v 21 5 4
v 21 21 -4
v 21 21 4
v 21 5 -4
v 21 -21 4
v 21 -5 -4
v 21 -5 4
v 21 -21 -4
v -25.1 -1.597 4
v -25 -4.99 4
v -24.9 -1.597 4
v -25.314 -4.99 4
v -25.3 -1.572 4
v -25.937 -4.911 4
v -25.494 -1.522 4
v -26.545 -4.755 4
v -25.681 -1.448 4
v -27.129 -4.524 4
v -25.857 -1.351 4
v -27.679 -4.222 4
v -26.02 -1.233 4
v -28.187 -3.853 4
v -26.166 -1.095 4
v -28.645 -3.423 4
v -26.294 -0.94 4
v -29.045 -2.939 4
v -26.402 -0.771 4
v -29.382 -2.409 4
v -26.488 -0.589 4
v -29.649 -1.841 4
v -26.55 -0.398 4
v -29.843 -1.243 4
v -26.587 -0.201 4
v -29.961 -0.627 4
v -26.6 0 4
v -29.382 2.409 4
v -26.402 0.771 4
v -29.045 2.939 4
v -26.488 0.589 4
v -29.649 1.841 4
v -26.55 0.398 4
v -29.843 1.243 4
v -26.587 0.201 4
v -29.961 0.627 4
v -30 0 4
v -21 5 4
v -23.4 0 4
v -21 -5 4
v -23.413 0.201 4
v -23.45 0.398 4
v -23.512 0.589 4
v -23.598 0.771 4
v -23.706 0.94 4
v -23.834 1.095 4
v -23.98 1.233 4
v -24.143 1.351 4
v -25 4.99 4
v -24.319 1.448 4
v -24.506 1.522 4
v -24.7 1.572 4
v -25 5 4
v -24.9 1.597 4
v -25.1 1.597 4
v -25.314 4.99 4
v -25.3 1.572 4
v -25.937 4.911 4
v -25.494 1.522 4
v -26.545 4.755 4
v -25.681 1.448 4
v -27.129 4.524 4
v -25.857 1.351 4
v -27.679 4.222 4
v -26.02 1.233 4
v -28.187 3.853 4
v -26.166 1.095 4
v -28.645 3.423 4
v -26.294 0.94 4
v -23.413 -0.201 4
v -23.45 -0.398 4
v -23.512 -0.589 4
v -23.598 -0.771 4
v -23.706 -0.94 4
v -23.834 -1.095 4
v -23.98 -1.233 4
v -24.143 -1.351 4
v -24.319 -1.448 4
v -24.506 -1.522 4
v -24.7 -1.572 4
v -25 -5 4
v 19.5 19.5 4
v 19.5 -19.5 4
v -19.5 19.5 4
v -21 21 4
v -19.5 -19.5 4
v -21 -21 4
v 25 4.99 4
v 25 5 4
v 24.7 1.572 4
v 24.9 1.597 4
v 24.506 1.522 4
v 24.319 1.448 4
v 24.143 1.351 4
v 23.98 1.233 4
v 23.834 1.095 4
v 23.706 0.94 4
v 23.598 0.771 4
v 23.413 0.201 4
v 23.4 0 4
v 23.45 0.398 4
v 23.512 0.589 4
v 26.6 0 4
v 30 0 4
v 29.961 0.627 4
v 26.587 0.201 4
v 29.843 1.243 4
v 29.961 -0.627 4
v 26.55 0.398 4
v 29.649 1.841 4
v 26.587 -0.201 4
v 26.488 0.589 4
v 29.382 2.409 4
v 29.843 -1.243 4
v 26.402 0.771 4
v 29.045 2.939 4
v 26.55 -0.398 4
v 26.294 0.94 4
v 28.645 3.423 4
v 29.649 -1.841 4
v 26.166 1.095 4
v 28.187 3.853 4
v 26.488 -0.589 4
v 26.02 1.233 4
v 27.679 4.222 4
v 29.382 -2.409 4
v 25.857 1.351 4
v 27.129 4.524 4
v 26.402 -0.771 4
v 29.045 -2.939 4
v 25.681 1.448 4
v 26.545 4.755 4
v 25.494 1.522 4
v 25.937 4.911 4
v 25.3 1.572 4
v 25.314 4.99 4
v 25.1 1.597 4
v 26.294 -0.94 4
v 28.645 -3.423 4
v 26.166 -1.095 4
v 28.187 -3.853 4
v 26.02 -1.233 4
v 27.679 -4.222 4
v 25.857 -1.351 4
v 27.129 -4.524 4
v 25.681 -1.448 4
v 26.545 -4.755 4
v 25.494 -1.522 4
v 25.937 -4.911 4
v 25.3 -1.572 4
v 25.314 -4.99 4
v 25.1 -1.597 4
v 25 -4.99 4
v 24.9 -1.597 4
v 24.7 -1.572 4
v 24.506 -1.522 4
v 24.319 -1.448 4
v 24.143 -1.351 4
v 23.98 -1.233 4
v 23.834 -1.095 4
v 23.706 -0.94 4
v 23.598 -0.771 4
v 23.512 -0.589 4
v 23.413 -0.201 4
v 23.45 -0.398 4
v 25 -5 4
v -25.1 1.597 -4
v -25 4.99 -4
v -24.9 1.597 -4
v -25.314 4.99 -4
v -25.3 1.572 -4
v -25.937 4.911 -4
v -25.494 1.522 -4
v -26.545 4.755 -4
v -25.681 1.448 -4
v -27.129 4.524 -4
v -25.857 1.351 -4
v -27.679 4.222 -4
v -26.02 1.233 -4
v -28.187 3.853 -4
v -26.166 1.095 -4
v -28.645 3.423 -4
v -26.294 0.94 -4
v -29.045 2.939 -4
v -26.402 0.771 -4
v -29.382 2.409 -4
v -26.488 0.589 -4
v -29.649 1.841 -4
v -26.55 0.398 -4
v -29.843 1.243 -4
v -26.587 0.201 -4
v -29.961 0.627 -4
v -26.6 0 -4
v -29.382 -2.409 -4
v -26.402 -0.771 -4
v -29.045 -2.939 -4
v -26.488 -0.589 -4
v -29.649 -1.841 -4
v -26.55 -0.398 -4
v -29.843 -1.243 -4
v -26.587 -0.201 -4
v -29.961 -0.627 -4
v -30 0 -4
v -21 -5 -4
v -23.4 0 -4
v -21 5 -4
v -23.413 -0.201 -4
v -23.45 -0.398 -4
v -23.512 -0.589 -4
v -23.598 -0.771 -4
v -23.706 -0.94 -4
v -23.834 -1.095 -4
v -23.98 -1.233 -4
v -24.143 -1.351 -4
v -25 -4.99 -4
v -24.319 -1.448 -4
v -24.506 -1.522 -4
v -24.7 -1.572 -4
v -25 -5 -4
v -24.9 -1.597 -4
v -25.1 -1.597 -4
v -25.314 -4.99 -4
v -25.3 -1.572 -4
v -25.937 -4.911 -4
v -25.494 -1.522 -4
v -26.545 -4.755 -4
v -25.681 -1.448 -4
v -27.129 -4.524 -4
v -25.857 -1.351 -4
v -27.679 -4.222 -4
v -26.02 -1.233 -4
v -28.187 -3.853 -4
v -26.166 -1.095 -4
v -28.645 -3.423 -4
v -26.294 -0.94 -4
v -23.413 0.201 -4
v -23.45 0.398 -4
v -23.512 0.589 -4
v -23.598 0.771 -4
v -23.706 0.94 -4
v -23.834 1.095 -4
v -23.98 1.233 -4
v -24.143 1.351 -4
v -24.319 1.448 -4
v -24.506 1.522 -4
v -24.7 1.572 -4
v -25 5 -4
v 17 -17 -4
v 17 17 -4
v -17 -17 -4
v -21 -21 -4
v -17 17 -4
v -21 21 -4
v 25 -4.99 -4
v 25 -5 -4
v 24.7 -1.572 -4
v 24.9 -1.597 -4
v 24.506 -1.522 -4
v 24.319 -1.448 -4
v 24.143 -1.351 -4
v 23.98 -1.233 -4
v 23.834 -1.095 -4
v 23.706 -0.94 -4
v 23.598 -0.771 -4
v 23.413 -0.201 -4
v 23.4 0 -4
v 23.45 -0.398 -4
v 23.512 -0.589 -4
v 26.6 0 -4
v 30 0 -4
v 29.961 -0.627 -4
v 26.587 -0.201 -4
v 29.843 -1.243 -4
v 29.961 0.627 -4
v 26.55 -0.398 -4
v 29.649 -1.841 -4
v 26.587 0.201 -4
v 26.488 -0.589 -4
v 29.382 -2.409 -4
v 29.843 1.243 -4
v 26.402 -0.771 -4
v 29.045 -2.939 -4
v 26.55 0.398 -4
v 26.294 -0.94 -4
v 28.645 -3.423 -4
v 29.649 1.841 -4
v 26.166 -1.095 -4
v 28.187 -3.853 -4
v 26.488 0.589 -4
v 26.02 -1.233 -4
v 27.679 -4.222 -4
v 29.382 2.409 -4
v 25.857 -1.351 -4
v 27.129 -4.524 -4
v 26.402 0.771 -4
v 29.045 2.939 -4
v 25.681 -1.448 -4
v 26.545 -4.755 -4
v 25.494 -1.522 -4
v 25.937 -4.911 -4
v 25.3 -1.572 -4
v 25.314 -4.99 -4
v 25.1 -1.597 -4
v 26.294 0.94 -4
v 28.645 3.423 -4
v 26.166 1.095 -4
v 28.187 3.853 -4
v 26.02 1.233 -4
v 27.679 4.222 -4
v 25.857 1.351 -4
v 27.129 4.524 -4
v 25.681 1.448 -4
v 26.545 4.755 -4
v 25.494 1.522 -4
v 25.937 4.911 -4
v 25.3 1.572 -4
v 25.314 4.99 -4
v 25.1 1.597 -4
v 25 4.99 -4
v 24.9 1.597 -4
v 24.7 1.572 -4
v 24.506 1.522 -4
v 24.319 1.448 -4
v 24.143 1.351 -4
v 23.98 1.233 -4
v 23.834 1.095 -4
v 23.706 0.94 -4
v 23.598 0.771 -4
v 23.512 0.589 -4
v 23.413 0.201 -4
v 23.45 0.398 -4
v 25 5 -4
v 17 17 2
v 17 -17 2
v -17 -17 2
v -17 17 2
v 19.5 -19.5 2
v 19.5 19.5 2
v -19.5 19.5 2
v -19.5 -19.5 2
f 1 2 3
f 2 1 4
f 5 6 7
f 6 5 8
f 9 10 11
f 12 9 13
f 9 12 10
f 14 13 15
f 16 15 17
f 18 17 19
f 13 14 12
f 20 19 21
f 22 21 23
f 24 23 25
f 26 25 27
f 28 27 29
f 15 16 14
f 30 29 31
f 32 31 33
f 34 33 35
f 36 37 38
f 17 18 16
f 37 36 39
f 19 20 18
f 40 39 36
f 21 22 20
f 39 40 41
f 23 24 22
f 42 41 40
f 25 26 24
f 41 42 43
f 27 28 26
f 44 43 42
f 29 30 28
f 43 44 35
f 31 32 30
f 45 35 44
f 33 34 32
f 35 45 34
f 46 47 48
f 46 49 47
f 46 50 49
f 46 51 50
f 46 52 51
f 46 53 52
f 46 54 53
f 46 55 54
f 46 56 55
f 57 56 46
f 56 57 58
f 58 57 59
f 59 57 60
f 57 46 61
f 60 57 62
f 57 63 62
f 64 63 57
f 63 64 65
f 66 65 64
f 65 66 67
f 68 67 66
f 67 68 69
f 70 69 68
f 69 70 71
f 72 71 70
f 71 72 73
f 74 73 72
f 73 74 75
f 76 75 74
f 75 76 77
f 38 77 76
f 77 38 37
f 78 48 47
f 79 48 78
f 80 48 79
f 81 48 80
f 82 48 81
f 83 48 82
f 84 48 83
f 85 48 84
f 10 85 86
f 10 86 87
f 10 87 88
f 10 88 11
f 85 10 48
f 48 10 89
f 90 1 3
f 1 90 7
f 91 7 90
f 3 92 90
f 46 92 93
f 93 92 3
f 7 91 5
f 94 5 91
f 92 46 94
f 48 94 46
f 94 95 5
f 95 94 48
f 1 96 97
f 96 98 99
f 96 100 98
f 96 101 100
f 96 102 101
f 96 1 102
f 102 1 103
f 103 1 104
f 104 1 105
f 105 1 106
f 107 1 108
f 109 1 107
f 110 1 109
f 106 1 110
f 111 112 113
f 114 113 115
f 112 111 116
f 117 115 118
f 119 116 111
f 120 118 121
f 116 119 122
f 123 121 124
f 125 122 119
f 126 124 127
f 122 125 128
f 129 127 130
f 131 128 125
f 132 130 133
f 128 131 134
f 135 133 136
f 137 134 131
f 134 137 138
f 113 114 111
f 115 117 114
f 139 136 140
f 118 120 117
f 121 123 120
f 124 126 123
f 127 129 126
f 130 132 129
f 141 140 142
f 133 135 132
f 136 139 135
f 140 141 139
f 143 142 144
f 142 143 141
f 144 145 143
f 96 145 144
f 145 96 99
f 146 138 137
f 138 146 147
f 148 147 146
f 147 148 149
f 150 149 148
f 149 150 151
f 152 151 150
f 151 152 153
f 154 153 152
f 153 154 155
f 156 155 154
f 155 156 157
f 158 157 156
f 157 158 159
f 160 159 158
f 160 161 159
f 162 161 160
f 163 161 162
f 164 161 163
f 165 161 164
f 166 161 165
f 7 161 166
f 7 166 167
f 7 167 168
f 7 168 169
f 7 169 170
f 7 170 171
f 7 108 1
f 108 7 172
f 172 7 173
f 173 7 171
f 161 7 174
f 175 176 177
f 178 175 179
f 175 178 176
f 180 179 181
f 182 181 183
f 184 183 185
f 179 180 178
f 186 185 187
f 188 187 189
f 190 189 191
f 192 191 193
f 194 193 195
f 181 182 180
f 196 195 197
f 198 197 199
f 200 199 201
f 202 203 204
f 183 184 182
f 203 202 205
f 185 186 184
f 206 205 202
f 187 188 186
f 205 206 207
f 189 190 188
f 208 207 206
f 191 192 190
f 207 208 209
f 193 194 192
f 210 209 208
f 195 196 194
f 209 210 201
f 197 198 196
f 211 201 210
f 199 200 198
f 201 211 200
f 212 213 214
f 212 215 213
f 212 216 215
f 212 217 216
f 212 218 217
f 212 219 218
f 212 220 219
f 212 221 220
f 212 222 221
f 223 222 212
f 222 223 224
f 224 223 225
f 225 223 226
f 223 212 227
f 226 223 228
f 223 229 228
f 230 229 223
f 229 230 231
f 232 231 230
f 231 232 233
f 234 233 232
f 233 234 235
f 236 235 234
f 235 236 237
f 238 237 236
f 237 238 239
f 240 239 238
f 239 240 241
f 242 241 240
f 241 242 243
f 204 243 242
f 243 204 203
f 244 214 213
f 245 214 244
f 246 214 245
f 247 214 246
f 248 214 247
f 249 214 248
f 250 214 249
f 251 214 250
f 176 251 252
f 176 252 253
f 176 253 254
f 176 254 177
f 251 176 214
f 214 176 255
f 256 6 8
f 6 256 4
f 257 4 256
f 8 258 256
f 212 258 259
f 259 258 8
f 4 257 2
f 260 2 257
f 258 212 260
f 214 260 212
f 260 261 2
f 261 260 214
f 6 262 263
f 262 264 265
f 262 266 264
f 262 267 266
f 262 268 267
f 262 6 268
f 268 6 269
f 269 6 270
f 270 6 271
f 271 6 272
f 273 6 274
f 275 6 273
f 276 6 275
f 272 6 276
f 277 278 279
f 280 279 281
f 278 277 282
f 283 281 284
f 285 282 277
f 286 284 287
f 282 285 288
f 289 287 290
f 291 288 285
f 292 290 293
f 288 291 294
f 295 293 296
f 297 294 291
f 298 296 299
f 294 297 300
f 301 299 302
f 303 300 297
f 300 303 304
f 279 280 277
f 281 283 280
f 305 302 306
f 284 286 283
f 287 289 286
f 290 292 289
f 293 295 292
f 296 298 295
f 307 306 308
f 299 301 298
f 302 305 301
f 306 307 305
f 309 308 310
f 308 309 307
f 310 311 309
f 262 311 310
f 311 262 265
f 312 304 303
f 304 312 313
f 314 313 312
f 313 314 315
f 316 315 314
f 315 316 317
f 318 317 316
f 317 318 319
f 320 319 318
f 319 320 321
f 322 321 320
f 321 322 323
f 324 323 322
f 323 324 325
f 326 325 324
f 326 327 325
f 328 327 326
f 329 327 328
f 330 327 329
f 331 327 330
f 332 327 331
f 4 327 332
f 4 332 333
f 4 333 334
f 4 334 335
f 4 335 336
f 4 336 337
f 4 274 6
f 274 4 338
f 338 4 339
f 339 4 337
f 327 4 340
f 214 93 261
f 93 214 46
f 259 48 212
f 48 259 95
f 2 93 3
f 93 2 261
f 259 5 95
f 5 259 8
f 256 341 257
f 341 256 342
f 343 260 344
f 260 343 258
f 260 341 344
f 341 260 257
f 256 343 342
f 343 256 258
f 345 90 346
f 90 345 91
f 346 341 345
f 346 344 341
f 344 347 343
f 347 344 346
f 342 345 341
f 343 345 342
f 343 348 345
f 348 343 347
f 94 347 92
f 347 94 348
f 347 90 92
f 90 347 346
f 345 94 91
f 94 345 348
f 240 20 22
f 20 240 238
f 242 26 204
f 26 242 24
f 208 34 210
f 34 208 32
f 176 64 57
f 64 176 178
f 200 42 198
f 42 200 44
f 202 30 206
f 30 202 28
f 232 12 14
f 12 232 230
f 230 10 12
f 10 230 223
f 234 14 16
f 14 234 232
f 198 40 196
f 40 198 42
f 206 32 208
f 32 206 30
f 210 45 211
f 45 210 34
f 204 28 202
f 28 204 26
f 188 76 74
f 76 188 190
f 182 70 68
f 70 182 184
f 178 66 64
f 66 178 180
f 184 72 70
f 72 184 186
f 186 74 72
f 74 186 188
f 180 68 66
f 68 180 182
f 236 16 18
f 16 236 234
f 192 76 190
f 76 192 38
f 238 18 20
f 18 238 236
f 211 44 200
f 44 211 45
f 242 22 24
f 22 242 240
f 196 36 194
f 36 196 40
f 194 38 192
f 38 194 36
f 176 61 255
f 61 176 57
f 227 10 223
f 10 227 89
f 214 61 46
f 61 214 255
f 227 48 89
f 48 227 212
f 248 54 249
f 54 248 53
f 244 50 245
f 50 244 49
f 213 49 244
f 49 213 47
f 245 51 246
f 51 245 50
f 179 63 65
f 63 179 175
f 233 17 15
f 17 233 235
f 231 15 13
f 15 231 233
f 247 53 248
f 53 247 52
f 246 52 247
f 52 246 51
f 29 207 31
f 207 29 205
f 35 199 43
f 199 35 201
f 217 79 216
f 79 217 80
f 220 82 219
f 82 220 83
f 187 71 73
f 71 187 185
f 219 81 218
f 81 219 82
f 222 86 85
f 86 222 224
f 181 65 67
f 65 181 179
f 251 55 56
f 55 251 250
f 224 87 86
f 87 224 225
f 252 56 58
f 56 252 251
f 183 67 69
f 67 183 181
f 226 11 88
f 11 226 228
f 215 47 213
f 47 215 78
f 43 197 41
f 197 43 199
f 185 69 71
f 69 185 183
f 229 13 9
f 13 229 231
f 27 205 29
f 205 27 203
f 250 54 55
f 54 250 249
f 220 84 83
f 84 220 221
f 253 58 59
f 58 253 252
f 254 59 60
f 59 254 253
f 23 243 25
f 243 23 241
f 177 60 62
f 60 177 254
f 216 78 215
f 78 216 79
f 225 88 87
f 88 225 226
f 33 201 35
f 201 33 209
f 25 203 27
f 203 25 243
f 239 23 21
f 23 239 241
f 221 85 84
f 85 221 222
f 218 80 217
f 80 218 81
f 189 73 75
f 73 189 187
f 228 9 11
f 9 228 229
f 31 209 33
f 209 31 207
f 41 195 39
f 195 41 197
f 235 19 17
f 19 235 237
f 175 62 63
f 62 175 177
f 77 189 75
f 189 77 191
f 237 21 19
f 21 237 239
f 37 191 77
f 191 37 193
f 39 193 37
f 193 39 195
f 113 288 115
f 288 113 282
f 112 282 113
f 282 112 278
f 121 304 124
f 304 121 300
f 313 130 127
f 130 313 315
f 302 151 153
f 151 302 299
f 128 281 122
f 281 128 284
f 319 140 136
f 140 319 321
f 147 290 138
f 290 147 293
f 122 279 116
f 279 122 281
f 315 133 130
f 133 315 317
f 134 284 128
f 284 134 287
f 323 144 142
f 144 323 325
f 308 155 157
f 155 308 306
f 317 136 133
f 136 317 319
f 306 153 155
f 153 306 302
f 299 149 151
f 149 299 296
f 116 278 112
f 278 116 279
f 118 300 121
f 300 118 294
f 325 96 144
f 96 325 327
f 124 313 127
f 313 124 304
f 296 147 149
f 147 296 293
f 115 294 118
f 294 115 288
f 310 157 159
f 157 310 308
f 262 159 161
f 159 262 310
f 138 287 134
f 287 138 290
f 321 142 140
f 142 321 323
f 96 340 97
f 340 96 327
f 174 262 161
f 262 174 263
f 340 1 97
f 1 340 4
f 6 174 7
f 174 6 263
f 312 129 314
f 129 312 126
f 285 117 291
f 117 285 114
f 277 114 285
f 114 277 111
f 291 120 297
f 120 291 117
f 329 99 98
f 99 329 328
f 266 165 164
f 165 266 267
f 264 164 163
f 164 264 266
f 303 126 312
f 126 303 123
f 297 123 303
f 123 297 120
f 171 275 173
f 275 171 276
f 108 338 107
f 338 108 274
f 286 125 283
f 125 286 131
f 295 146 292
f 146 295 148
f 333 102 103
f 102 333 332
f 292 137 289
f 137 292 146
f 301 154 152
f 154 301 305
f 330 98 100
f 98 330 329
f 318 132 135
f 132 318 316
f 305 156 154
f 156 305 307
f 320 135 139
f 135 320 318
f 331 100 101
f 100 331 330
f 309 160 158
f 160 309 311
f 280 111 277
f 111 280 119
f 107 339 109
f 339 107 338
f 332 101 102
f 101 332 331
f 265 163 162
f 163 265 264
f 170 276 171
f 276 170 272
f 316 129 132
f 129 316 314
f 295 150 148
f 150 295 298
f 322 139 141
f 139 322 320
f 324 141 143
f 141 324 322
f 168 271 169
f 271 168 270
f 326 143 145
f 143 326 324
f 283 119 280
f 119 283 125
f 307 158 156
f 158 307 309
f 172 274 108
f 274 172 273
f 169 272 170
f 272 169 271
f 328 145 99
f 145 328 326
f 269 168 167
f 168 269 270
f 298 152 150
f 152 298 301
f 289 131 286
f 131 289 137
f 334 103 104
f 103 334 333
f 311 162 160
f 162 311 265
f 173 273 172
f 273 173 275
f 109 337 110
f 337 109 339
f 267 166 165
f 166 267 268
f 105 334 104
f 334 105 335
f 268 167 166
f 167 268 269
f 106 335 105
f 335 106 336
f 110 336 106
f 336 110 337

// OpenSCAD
//
// backplate of ArduCam IMX291
//

camera_square = 38.00;
lip_width = 2;
depth = 12 - 4;  // subtract 4mm since you took off the back mount

circuit_board_thickness = 1.75;

globe_major = 10;
globe_pilot = 3.2;
globe_bar_thickness = 4;

globe_bar_width = 4;

$fn = 50;

union() {
    difference() {
        {
        // major square
        cube([camera_square + (2*lip_width), 
            camera_square + (2*lip_width), 
            depth], center=true);
        }
        // subtract the center
        {
        // remove the center
        cube([camera_square - (2*lip_width), 
            camera_square - (2*lip_width), 
            depth], center=true);
        // board mounting lip
        translate([0,0, (depth/2 - circuit_board_thickness/2)])
            cube([camera_square + 1 ,
                camera_square + 1,
                circuit_board_thickness + 0.5], center=true);
        }
    }
    

    
    // add side mounts
    // left side
    difference () {
        union () {
        translate([-((camera_square+2)/2 + globe_major/2),0,0])
        cylinder(r = globe_major/2, h = depth, center = true);
        
        translate([-((camera_square+2)/2 + globe_major/4),0,0])
        cube([globe_major/2, globe_major, depth], center = true);
        }
        // screw hole
        {
        translate([-((camera_square+2)/2 + globe_major/2),0,0])
        cylinder(r = globe_pilot/2, h = depth, center = true);
        }
    }
    // right side
    difference () {
        union () {
        translate([((camera_square+2)/2 + globe_major/2),0,0])
        cylinder(r = globe_major/2, h = depth, center = true);
        
        translate([((camera_square+2)/2 + globe_major/4),0,0])
        cube([globe_major/2, globe_major, depth], center = true);
        }
        // screw hole
        {
        translate([((camera_square+2)/2 + globe_major/2),0,0])
        cylinder(r = globe_pilot/2, h = depth, center = true);
        }
    }
} // union
